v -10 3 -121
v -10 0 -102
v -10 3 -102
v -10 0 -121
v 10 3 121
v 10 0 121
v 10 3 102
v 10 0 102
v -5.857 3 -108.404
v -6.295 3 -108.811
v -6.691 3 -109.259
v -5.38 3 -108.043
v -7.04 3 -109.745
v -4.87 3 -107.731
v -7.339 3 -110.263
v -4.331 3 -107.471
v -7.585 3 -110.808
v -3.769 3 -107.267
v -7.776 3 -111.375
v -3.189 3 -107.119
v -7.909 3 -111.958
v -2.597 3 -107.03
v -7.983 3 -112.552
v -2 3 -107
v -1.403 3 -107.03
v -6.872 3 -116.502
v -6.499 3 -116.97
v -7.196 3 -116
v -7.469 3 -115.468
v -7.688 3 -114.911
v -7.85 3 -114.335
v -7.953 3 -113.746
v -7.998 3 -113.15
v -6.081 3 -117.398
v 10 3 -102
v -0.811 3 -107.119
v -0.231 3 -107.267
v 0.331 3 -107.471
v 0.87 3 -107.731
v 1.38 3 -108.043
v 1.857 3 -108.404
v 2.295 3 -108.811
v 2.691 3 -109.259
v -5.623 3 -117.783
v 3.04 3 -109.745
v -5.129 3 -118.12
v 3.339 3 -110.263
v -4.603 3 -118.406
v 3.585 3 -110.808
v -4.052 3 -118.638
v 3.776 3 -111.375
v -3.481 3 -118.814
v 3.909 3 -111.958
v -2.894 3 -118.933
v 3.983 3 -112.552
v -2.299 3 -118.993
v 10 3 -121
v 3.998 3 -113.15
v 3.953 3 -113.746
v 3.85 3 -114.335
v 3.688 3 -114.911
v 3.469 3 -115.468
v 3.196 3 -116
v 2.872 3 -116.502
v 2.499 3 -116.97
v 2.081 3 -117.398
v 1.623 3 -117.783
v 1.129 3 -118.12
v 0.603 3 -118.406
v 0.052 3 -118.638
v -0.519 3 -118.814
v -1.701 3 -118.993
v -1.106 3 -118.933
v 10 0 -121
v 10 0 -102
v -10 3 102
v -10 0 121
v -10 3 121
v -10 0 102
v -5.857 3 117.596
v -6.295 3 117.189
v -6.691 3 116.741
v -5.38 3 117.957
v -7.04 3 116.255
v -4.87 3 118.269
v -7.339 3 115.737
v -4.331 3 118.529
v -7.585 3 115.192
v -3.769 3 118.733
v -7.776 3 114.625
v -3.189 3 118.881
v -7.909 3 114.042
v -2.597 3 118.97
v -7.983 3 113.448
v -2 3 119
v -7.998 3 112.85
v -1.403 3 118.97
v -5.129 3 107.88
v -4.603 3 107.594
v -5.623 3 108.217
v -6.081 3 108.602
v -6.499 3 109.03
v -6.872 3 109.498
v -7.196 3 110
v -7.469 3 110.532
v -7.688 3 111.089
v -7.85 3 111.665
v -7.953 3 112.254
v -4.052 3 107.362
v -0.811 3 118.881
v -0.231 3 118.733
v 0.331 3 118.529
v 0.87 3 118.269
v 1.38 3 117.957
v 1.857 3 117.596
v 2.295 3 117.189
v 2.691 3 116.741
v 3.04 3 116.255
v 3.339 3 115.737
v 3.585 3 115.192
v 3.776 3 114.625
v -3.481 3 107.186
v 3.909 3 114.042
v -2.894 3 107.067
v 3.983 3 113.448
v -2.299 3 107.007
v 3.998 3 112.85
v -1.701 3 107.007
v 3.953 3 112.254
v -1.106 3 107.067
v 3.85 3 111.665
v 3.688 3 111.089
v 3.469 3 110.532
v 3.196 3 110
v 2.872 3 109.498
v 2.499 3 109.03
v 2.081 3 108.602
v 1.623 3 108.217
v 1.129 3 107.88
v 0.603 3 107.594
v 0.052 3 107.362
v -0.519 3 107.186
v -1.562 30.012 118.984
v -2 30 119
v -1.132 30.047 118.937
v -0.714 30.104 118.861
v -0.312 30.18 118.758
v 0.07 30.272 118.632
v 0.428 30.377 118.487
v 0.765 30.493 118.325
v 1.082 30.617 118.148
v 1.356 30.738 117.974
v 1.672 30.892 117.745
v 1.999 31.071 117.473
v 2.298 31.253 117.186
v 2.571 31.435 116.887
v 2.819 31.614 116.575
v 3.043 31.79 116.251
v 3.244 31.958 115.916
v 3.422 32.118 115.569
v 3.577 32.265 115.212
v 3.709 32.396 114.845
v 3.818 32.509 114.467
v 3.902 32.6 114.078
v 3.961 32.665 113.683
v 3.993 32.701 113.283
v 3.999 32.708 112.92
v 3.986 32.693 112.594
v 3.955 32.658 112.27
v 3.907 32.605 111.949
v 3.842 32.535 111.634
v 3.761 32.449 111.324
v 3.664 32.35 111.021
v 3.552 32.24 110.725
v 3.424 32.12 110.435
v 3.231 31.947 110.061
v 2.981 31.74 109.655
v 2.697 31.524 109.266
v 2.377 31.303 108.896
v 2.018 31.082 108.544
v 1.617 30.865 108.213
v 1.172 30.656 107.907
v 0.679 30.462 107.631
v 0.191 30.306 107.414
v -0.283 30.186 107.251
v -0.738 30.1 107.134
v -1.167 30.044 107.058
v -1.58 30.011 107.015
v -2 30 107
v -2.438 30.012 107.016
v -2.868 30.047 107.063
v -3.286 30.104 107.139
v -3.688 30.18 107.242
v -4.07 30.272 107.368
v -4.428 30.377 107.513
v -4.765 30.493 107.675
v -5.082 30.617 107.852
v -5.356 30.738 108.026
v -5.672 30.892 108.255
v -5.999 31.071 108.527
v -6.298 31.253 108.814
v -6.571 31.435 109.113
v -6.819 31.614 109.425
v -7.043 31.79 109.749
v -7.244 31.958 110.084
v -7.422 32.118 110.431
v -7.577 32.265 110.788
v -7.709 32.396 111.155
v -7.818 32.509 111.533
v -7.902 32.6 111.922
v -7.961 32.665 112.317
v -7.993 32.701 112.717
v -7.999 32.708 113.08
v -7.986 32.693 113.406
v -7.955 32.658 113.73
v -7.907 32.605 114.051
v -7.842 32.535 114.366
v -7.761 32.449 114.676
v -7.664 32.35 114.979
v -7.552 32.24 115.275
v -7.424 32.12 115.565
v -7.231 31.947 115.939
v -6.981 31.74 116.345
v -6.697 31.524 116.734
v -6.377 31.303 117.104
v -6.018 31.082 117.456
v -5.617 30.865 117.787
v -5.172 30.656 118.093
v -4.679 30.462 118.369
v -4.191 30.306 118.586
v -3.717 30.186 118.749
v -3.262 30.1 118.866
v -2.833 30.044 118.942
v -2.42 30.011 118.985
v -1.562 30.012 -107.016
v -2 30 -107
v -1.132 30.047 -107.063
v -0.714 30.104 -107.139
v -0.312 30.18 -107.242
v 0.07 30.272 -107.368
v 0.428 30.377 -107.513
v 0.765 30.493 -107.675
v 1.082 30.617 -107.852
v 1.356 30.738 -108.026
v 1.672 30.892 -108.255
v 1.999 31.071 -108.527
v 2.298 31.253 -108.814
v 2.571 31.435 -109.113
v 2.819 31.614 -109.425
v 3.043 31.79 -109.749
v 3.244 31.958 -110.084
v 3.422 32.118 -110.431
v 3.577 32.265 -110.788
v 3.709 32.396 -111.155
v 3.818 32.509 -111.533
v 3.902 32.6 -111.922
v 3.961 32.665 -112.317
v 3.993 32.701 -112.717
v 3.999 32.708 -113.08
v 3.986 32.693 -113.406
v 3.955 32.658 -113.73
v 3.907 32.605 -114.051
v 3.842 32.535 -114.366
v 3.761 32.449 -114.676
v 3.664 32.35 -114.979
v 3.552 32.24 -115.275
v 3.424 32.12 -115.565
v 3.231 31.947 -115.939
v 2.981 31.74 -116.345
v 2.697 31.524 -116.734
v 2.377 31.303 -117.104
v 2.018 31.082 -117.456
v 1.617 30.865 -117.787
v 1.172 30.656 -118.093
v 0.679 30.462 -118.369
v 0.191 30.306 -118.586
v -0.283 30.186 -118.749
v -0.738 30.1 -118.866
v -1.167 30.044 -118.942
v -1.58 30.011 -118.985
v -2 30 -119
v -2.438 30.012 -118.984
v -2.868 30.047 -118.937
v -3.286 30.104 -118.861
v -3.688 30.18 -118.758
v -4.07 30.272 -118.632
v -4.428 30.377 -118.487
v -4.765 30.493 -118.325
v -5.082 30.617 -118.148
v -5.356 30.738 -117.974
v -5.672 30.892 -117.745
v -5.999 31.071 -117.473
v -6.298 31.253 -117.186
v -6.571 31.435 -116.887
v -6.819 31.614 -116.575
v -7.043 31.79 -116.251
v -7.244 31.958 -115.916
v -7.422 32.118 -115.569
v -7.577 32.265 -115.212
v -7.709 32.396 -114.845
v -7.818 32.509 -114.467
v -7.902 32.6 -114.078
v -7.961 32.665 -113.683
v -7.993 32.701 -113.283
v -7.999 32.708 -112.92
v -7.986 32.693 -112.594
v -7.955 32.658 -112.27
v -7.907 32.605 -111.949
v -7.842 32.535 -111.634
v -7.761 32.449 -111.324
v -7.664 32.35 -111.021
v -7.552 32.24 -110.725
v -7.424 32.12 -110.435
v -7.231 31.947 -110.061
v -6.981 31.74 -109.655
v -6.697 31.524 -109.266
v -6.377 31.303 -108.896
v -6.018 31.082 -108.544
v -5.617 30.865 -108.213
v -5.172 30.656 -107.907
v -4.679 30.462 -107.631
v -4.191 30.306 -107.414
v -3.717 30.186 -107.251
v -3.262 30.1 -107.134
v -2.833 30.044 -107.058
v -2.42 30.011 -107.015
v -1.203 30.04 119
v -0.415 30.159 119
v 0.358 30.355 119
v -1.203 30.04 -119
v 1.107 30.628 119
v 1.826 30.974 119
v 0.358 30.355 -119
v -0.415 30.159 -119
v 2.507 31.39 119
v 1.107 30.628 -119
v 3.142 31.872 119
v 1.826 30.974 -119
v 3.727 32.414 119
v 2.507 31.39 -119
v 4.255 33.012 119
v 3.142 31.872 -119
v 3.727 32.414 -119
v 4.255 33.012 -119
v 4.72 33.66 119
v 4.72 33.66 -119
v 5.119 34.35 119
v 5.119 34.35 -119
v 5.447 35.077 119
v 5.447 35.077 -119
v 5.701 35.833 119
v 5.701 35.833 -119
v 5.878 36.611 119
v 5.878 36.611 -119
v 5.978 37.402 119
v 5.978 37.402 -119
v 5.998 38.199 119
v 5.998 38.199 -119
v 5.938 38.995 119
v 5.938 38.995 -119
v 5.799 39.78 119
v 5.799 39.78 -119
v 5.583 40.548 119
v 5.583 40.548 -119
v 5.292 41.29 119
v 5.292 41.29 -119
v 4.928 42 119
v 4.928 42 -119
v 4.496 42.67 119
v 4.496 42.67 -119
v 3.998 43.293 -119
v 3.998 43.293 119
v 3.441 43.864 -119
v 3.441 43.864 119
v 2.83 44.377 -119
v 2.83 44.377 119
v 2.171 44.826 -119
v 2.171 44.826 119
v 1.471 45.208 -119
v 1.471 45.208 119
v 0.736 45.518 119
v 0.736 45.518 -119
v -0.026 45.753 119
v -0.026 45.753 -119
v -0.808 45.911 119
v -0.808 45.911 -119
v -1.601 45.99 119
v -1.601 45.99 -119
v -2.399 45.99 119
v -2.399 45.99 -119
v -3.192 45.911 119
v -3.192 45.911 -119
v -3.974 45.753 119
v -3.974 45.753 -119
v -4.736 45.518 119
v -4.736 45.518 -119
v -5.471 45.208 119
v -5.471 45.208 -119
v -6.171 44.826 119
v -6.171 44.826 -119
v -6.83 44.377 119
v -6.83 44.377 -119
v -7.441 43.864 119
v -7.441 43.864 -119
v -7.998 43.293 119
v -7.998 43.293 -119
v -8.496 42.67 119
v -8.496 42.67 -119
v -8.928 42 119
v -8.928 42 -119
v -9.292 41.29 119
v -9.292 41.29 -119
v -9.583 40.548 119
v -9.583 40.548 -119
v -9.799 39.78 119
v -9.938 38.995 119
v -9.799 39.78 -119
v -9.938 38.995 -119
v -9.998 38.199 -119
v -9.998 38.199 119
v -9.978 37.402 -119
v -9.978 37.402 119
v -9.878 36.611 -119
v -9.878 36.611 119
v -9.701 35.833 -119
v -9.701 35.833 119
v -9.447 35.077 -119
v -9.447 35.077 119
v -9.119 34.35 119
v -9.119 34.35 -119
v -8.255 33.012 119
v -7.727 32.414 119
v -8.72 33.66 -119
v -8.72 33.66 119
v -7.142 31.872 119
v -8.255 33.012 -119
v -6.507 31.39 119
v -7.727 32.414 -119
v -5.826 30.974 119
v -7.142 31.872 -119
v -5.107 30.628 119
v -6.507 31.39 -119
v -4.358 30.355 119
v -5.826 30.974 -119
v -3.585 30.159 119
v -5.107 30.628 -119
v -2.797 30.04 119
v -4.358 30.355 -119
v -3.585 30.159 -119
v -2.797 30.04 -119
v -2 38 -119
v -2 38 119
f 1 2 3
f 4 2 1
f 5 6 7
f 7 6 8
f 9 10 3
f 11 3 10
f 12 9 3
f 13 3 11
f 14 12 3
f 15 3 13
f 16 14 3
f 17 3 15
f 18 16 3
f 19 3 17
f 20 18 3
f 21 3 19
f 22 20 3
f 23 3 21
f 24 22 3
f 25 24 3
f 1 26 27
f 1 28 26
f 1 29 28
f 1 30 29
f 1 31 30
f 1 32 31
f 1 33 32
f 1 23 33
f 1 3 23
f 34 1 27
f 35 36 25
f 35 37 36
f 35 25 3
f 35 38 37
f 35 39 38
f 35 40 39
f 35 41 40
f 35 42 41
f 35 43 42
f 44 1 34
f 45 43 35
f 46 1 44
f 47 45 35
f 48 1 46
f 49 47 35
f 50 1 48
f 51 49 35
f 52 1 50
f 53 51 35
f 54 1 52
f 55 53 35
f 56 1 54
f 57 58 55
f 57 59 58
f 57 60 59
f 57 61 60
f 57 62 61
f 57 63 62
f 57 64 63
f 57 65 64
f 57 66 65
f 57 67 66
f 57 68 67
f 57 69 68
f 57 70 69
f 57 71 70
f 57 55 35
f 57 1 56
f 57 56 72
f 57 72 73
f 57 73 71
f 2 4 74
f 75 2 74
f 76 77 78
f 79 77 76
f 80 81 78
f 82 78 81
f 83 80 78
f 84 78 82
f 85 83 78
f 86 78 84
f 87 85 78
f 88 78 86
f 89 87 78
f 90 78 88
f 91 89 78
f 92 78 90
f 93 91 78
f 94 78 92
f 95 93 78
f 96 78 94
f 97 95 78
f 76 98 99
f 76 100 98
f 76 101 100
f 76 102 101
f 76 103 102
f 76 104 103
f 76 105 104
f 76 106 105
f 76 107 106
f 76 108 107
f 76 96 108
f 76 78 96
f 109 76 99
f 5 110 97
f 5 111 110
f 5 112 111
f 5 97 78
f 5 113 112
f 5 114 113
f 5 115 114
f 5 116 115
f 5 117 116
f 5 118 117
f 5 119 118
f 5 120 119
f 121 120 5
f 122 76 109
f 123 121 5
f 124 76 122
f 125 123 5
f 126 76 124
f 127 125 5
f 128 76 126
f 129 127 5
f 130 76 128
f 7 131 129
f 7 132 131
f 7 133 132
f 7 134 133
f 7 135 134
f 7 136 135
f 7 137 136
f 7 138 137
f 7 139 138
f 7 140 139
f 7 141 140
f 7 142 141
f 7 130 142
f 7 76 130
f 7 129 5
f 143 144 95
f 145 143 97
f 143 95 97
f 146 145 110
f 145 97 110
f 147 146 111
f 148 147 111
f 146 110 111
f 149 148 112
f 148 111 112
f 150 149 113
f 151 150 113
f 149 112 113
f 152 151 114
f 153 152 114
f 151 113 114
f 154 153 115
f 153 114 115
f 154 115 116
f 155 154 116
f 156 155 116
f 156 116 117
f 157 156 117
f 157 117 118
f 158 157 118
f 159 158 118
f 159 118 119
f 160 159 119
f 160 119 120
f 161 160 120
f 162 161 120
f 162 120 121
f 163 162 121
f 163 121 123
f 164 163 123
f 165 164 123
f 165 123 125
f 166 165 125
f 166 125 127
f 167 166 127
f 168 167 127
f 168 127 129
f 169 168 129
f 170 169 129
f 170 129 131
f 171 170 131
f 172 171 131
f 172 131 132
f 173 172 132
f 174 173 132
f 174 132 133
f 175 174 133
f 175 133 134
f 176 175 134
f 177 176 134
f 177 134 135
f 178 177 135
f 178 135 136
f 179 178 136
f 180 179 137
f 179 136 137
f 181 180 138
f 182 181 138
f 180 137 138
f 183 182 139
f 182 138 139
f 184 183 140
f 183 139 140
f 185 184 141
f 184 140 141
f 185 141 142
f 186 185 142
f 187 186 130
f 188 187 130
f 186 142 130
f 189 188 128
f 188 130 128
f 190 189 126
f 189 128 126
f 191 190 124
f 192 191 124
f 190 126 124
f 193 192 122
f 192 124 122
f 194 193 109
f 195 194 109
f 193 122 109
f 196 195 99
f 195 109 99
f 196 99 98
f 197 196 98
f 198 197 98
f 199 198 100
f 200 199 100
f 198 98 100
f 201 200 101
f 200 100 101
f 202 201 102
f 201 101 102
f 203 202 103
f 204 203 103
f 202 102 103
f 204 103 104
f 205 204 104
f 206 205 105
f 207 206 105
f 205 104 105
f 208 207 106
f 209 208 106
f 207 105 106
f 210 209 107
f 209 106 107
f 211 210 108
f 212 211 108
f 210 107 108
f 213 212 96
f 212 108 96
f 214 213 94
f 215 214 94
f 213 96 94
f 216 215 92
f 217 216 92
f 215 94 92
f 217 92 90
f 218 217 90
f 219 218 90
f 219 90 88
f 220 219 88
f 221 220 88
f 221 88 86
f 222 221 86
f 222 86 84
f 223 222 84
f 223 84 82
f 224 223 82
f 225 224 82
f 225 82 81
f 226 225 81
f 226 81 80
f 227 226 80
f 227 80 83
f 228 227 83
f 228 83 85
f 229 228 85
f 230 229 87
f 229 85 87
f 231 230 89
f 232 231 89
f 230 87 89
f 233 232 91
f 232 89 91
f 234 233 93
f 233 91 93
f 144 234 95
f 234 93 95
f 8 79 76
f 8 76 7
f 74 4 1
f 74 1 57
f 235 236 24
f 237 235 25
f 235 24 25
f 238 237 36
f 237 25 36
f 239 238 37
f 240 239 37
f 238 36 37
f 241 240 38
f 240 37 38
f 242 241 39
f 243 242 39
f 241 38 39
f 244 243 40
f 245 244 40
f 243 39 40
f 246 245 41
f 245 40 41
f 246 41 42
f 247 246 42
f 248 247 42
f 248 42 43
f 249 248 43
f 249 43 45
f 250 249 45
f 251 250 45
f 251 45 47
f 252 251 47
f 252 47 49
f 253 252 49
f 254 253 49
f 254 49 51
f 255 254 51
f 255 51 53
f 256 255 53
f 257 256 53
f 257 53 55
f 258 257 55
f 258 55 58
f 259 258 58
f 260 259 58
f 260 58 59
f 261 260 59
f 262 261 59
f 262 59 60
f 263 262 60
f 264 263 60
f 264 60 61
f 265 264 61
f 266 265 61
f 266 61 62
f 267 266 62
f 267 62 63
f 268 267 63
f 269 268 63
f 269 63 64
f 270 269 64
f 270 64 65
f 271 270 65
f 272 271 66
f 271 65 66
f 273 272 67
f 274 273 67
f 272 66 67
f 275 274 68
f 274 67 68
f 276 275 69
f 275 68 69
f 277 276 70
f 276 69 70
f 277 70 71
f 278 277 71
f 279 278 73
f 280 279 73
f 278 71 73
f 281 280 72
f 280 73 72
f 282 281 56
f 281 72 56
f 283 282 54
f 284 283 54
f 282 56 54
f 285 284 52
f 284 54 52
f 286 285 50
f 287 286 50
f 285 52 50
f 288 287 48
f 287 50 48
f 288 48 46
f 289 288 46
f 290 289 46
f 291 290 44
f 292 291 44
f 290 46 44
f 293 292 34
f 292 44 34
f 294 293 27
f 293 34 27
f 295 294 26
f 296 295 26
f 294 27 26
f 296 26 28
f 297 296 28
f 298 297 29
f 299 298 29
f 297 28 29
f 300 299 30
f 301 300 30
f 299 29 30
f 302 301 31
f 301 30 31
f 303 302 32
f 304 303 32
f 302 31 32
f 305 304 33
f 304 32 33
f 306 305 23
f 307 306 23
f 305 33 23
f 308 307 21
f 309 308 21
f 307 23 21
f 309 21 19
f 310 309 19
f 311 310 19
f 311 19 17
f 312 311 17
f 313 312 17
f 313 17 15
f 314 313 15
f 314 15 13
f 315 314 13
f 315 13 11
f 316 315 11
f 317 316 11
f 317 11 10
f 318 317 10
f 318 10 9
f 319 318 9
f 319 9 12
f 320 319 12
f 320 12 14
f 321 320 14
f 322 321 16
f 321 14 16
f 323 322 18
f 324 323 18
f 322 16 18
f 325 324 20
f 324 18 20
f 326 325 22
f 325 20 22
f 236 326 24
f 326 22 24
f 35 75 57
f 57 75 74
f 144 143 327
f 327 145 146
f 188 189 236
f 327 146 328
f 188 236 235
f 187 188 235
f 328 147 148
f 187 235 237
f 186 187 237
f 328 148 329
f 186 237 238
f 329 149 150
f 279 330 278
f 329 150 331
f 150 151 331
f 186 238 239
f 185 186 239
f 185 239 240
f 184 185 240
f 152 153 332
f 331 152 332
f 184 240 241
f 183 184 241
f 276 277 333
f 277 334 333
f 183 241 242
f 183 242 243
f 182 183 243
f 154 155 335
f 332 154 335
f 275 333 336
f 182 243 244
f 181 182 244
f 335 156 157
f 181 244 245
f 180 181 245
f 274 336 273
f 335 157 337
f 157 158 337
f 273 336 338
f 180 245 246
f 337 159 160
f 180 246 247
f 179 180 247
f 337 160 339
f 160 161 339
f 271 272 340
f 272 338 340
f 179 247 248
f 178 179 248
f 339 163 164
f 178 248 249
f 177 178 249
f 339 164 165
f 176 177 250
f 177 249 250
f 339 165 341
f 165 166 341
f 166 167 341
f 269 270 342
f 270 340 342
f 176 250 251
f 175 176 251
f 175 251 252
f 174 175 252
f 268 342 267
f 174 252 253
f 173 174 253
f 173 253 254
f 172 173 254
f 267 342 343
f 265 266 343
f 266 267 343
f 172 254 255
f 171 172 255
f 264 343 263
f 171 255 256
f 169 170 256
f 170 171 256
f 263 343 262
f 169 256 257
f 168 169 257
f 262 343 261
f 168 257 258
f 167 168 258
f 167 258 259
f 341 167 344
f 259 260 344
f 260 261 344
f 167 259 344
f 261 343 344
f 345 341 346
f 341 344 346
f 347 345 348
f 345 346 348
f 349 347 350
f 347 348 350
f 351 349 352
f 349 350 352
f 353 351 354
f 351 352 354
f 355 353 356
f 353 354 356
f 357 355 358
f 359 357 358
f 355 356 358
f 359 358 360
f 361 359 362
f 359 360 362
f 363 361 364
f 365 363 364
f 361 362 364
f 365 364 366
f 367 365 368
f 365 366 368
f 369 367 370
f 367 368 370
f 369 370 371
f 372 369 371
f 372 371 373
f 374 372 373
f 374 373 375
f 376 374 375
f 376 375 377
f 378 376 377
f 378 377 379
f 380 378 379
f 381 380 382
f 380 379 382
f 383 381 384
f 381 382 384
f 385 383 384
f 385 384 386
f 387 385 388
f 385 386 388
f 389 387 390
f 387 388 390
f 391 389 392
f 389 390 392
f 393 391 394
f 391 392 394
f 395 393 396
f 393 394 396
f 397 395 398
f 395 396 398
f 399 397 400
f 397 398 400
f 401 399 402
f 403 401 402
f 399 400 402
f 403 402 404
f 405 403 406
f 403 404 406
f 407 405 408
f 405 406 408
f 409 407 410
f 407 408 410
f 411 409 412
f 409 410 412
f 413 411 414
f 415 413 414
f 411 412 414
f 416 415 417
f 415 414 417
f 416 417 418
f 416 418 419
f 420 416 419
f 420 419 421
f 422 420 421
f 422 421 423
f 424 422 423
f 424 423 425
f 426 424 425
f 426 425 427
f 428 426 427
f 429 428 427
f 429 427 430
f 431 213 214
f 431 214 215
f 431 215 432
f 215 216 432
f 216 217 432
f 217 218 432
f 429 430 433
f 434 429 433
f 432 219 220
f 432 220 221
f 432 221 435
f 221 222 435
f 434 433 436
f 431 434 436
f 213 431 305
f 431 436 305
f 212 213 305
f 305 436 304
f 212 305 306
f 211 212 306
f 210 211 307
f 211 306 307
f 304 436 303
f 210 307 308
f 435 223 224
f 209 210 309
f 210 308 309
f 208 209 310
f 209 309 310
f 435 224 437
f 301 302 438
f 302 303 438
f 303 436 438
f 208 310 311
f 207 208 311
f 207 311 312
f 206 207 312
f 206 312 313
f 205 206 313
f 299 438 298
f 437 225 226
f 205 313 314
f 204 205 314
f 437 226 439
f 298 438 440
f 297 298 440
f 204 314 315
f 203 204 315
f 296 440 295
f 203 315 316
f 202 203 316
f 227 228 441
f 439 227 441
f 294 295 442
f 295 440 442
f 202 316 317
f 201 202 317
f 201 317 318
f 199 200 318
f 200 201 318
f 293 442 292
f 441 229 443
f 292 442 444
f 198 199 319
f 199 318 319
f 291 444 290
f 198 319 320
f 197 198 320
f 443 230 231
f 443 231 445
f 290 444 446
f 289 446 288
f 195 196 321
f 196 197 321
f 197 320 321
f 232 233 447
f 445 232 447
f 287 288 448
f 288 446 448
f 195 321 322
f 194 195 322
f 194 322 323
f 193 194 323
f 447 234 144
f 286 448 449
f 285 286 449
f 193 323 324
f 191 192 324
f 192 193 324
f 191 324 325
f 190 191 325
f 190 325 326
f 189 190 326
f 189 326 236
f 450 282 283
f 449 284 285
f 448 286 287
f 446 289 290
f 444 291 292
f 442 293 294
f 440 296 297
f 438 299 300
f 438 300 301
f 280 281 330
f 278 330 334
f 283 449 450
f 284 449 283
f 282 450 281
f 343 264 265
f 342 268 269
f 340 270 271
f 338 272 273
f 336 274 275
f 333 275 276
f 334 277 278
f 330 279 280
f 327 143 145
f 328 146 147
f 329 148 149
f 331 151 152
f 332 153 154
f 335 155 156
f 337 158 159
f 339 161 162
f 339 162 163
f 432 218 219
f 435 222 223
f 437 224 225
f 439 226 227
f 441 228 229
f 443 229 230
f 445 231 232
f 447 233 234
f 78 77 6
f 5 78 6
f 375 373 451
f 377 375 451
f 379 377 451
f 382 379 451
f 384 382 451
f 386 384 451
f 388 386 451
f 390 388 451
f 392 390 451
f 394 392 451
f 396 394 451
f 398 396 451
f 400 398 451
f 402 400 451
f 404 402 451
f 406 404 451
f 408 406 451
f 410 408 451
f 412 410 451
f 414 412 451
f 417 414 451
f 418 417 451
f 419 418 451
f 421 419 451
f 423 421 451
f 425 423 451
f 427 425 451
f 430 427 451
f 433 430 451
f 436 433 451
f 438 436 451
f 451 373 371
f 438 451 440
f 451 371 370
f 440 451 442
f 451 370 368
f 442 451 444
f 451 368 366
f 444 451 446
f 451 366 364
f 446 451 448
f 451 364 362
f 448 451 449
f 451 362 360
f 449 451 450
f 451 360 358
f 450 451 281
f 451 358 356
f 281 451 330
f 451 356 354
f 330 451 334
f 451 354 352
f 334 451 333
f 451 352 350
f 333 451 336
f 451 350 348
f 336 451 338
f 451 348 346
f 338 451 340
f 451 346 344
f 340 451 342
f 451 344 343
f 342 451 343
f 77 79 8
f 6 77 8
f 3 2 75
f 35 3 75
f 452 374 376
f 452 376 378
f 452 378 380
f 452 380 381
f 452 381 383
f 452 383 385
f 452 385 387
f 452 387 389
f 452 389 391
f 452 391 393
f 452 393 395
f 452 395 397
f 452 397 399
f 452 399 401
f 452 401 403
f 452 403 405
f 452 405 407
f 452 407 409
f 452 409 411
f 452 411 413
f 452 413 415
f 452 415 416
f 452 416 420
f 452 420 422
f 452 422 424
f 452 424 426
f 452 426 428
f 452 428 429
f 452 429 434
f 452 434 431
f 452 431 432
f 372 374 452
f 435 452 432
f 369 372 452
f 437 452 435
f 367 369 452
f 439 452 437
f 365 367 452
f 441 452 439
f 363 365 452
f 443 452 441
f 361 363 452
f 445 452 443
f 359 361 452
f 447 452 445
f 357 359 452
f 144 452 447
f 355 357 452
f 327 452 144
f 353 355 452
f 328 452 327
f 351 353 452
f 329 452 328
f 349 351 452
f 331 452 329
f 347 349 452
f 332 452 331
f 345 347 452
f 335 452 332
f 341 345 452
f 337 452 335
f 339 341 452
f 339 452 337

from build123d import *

# Parameters (mm, degrees)
SK_P01_FOOT_W  = 20
SK_P01_FOOT_H  = 19
P01_FOOT_DEPTH = 3
SK_P02_FOOT_W  = 20
SK_P02_FOOT_H  = 19
P02_FOOT_DEPTH = 3
P03_LEG_START  = 3
SK_P03_LEG_R   = 6
P03_LEG_DEPTH  = 35
P04_LEG_START  = 3
SK_P04_LEG_R   = 6
P04_LEG_DEPTH  = 35
P05_GRIP_START = -119
SK_P05_GRIP_R  = 8
P05_GRIP_DEPTH = 238


with BuildPart() as part:
    # SK_P01_Foot → P01_Foot (new body)
    with BuildSketch(Plane(origin=(0, 0, 0), x_dir=(1, 0, 0), z_dir=(0, 1, 0))):
        with Locations((0, -111.5)):
            Rectangle(SK_P01_FOOT_W, SK_P01_FOOT_H)
    extrude(amount=P01_FOOT_DEPTH)

    # SK_P03_Leg → P03_Leg (add)
    with BuildSketch(Plane(origin=(0, 0, 0), x_dir=(1, 0, 0), z_dir=(0, 1, 0)).offset(P03_LEG_START)):
        with Locations(Location((-2, -113, 0), (0, 0, 270))):
            Circle(SK_P03_LEG_R)
    extrude(amount=P03_LEG_DEPTH)



with BuildPart() as body_2:
    # SK_P02_Foot → P02_Foot (new body)
    with BuildSketch(Plane(origin=(0, 0, 0), x_dir=(1, 0, 0), z_dir=(0, 1, 0))):
        with Locations((0, 111.5)):
            Rectangle(SK_P02_FOOT_W, SK_P02_FOOT_H)
    extrude(amount=P02_FOOT_DEPTH)

    # SK_P04_Leg → P04_Leg (add)
    with BuildSketch(Plane(origin=(0, 0, 0), x_dir=(1, 0, 0), z_dir=(0, 1, 0)).offset(P04_LEG_START)):
        with Locations(Location((-2, 113, 0), (0, 0, 270))):
            Circle(SK_P04_LEG_R)
    extrude(amount=P04_LEG_DEPTH)


with BuildPart() as part_1:
    add(part.part)

    add(body_2.part)  # P05_Grip merges body 2
    # SK_P05_Grip → P05_Grip (add)
    with BuildSketch(Plane.XY.offset(P05_GRIP_START)):
        with Locations(Location((-2, 38, 0), (0, 0, 270))):
            Circle(SK_P05_GRIP_R)
    extrude(amount=P05_GRIP_DEPTH)


solid = part_1.part
